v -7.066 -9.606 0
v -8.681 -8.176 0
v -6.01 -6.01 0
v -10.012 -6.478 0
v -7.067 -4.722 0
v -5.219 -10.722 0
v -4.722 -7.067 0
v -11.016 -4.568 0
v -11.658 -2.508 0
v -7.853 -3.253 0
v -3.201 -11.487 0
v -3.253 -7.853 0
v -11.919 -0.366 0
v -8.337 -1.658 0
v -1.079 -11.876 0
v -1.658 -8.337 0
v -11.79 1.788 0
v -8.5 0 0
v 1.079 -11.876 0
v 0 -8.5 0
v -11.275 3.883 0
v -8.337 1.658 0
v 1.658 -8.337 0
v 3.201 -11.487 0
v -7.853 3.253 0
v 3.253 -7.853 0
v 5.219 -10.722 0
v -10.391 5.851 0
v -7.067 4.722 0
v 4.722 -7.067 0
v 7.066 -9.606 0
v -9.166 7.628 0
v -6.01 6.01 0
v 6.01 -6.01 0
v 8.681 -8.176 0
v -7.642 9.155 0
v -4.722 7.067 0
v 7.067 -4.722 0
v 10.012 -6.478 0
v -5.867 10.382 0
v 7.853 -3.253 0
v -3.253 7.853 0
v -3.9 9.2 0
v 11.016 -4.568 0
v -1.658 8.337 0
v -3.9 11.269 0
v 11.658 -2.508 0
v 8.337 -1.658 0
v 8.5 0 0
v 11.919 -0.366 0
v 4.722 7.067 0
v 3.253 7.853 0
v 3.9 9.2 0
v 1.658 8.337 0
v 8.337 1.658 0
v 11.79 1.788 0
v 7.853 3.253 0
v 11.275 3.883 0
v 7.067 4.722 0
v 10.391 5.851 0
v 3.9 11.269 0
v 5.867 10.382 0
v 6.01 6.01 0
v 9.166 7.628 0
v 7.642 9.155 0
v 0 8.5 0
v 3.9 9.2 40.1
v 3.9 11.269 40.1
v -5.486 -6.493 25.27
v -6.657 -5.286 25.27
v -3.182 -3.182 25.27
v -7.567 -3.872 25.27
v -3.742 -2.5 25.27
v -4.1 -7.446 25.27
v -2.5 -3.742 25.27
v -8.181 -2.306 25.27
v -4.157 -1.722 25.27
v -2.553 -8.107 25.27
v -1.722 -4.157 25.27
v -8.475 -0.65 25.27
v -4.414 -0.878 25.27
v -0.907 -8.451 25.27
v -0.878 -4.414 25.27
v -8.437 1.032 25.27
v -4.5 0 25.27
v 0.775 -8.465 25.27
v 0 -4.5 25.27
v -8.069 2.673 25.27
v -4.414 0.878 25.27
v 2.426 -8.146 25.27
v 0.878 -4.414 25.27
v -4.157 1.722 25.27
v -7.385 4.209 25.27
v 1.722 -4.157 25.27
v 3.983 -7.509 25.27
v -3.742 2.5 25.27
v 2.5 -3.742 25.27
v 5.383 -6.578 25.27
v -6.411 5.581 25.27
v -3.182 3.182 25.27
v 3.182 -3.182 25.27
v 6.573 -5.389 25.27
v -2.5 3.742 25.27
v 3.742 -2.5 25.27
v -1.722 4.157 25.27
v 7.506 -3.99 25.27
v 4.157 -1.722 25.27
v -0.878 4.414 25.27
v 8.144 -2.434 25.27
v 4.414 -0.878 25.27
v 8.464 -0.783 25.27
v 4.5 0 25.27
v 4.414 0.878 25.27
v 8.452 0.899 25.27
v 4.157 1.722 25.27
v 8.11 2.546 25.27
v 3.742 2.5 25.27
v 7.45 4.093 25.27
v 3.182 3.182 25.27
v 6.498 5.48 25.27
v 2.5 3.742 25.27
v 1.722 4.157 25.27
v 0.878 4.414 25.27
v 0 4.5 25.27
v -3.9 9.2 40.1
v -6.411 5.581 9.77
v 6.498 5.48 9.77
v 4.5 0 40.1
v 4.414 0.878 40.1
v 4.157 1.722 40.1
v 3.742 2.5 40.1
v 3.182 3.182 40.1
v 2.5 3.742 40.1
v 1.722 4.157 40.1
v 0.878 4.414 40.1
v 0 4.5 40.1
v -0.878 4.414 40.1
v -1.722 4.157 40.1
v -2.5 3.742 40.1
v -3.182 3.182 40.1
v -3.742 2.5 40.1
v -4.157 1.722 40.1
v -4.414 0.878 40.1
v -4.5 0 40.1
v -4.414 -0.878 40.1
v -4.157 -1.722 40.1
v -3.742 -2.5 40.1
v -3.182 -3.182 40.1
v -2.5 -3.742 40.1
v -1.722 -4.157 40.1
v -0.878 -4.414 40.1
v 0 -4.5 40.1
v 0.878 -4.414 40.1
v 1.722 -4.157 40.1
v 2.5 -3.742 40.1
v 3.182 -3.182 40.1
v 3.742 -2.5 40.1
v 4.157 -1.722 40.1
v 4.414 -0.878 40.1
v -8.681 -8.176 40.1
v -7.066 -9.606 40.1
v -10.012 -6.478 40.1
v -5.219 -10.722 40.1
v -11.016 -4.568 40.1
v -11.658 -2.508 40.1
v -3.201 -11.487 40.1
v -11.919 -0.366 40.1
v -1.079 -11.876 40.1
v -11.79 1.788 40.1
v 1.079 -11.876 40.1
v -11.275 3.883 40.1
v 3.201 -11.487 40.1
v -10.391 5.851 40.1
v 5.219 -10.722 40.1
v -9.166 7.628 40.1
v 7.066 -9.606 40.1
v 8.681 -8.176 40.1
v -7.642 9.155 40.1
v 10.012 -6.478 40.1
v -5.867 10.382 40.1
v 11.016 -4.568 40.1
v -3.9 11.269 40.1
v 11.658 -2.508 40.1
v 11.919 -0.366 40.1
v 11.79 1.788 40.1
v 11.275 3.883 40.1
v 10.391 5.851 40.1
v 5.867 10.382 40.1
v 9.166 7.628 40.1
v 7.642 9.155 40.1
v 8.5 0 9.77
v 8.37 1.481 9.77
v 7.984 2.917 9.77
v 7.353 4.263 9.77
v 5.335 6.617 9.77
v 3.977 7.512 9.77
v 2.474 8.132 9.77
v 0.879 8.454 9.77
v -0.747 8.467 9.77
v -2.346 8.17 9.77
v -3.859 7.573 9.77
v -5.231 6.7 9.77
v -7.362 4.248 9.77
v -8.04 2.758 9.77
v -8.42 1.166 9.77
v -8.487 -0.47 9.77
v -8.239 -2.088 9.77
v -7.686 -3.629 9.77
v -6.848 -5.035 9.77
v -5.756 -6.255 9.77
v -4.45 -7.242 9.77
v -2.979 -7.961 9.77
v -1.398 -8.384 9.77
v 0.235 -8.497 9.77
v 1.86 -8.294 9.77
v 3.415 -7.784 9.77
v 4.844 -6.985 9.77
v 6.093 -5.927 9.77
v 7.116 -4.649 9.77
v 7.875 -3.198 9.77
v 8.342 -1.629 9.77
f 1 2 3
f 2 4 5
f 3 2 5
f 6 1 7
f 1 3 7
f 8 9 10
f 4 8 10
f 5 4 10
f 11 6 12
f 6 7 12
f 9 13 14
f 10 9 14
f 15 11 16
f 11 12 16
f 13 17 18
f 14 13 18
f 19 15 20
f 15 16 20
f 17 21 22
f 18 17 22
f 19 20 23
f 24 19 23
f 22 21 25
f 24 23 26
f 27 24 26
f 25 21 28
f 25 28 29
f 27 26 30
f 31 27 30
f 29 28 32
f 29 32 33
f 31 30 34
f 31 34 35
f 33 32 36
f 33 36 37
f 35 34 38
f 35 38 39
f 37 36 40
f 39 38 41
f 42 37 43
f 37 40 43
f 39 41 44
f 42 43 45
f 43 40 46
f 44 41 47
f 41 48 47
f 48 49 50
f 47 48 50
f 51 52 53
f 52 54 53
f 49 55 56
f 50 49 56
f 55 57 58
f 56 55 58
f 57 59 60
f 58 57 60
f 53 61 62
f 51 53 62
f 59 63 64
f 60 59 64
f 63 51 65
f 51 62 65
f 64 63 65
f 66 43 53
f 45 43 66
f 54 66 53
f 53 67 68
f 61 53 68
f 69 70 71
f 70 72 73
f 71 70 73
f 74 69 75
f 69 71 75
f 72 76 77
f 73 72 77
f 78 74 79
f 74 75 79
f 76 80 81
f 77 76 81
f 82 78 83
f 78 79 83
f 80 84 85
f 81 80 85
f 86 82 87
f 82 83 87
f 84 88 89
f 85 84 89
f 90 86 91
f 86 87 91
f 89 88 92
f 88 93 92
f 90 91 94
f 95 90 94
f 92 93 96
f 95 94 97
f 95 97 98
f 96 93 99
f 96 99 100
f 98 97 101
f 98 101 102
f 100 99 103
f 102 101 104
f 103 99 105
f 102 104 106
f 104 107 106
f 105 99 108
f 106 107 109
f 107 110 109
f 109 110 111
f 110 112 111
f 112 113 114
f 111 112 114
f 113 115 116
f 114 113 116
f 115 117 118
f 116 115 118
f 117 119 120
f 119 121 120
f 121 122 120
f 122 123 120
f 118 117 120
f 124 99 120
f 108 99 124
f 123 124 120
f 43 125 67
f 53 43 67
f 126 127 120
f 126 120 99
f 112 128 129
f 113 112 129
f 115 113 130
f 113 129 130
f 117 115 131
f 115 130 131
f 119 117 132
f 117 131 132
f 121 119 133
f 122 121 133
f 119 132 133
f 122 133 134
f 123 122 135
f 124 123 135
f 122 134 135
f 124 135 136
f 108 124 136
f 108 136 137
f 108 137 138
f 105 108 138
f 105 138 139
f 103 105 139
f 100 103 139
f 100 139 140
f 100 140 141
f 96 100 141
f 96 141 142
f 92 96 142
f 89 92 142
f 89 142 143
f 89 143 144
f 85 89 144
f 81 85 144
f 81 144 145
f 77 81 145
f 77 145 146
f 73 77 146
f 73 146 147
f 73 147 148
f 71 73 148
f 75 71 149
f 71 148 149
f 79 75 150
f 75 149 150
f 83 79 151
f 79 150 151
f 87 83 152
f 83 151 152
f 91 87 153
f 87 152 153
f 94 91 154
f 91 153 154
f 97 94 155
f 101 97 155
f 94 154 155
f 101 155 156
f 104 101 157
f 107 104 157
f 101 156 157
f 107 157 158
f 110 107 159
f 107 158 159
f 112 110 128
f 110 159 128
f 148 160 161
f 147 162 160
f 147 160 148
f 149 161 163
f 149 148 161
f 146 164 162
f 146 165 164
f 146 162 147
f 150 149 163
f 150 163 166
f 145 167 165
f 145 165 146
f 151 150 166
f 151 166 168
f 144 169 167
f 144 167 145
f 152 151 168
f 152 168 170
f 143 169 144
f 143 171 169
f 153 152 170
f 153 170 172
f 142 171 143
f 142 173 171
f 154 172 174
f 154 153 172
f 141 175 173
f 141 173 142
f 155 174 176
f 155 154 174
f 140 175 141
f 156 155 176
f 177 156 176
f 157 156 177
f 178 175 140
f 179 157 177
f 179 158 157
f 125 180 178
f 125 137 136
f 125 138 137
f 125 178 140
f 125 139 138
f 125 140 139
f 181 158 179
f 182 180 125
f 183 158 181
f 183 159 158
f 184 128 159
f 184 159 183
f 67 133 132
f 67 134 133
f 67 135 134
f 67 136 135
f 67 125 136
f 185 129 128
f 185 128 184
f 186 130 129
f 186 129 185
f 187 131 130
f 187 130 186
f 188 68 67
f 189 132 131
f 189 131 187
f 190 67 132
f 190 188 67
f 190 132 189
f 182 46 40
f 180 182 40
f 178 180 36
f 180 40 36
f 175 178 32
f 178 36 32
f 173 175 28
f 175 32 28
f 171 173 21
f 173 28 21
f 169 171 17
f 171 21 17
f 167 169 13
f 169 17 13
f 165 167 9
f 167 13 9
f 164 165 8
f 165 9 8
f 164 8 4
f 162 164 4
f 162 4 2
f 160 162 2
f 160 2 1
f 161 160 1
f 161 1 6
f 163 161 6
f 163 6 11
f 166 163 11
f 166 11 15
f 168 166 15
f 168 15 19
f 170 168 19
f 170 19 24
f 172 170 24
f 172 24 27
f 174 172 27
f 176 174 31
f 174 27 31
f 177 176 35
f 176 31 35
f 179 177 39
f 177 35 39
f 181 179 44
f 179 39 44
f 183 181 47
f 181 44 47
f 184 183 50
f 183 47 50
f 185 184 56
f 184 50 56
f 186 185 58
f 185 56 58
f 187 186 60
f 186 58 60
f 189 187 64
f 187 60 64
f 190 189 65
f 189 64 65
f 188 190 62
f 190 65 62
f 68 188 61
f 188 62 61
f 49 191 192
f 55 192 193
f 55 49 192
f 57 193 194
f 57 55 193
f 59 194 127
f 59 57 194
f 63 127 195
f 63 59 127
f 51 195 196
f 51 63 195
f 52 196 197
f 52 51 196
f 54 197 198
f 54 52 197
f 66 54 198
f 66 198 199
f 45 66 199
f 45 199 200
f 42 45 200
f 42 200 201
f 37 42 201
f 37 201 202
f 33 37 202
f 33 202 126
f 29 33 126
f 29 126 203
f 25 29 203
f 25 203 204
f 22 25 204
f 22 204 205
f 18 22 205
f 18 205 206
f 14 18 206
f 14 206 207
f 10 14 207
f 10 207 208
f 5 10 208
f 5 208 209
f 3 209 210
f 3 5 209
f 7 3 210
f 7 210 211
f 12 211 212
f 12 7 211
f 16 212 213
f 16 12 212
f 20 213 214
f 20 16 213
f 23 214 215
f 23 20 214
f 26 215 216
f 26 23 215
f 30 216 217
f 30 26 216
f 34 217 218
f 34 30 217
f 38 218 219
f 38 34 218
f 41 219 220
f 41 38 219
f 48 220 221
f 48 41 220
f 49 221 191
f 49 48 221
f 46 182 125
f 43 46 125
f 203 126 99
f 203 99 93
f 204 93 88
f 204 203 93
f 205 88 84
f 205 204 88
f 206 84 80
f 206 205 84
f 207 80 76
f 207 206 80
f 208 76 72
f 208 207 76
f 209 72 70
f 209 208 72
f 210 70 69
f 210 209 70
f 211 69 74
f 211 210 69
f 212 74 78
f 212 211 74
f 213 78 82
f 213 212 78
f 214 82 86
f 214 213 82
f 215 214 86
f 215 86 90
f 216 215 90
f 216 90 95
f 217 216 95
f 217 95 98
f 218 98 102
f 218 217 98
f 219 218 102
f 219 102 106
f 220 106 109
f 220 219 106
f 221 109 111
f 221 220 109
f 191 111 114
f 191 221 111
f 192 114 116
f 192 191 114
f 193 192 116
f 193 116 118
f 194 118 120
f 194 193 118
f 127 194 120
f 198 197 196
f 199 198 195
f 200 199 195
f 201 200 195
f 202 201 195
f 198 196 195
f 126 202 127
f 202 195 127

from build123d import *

# Parameters (mm, degrees)
ESQUISSE1_R             = 11.925
BOSS_EXTRU_1_DEPTH      = 40.1
ESQUISSE2_R             = 8.5
ENL_V_MAT_EXTRU_1_DEPTH = 9.77
ENL_V_MAT_EXTRU_2_DEPTH = 15.5
ESQUISSE5_R             = 4.5
ENL_V_MAT_EXTRU_3_DEPTH = 41.1
ENL_V_MAT_EXTRU_5_DEPTH = 41.1


with BuildPart() as part:
    # Esquisse1 → Boss.-Extru.1 (new body)
    with BuildSketch(Plane.XY):
        Circle(ESQUISSE1_R)
    extrude(amount=BOSS_EXTRU_1_DEPTH)

    # Esquisse2 → Enlèv. mat.-Extru.1 (cut)
    with BuildSketch(Plane.XY):
        Circle(ESQUISSE2_R)
    extrude(amount=ENL_V_MAT_EXTRU_1_DEPTH, mode=Mode.SUBTRACT)

    # Esquisse4 → Enlèv. mat.-Extru.2 (cut)
    with BuildSketch(Plane(origin=(0, 0, 9.77), x_dir=(-1, 0, 0), z_dir=(0, 0, -1))):
        with BuildLine():
            Line((-6.498055974, 5.479531783), (6.411422693, 5.580650415))
            ThreePointArc((6.411422693, 5.580650415), (0.066577592, -8.499739256), (-6.498055974, 5.479531783))
        make_face()
    extrude(amount=-ENL_V_MAT_EXTRU_2_DEPTH, mode=Mode.SUBTRACT)

    # Esquisse5 → Enlèv. mat.-Extru.3 (cut, through all)
    with BuildSketch(Plane.XY.offset(40.1)):
        Circle(ESQUISSE5_R)
    extrude(amount=-ENL_V_MAT_EXTRU_3_DEPTH, mode=Mode.SUBTRACT)

    # Esquisse6 → Enlèv. mat.-Extru.5 (cut, through all)
    with BuildSketch(Plane.XY.offset(40.1)):
        with BuildLine():
            Line((-3.9, 11.269233559), (-3.9, 9.199599168))
            Line((-3.9, 9.199599168), (3.9, 9.199599168))
            Line((3.9, 9.199599168), (3.9, 11.269233559))
            ThreePointArc((3.9, 11.269233559), (0, 11.925), (-3.9, 11.269233559))
        make_face()
    extrude(amount=-ENL_V_MAT_EXTRU_5_DEPTH, mode=Mode.SUBTRACT)


solid = part.part
